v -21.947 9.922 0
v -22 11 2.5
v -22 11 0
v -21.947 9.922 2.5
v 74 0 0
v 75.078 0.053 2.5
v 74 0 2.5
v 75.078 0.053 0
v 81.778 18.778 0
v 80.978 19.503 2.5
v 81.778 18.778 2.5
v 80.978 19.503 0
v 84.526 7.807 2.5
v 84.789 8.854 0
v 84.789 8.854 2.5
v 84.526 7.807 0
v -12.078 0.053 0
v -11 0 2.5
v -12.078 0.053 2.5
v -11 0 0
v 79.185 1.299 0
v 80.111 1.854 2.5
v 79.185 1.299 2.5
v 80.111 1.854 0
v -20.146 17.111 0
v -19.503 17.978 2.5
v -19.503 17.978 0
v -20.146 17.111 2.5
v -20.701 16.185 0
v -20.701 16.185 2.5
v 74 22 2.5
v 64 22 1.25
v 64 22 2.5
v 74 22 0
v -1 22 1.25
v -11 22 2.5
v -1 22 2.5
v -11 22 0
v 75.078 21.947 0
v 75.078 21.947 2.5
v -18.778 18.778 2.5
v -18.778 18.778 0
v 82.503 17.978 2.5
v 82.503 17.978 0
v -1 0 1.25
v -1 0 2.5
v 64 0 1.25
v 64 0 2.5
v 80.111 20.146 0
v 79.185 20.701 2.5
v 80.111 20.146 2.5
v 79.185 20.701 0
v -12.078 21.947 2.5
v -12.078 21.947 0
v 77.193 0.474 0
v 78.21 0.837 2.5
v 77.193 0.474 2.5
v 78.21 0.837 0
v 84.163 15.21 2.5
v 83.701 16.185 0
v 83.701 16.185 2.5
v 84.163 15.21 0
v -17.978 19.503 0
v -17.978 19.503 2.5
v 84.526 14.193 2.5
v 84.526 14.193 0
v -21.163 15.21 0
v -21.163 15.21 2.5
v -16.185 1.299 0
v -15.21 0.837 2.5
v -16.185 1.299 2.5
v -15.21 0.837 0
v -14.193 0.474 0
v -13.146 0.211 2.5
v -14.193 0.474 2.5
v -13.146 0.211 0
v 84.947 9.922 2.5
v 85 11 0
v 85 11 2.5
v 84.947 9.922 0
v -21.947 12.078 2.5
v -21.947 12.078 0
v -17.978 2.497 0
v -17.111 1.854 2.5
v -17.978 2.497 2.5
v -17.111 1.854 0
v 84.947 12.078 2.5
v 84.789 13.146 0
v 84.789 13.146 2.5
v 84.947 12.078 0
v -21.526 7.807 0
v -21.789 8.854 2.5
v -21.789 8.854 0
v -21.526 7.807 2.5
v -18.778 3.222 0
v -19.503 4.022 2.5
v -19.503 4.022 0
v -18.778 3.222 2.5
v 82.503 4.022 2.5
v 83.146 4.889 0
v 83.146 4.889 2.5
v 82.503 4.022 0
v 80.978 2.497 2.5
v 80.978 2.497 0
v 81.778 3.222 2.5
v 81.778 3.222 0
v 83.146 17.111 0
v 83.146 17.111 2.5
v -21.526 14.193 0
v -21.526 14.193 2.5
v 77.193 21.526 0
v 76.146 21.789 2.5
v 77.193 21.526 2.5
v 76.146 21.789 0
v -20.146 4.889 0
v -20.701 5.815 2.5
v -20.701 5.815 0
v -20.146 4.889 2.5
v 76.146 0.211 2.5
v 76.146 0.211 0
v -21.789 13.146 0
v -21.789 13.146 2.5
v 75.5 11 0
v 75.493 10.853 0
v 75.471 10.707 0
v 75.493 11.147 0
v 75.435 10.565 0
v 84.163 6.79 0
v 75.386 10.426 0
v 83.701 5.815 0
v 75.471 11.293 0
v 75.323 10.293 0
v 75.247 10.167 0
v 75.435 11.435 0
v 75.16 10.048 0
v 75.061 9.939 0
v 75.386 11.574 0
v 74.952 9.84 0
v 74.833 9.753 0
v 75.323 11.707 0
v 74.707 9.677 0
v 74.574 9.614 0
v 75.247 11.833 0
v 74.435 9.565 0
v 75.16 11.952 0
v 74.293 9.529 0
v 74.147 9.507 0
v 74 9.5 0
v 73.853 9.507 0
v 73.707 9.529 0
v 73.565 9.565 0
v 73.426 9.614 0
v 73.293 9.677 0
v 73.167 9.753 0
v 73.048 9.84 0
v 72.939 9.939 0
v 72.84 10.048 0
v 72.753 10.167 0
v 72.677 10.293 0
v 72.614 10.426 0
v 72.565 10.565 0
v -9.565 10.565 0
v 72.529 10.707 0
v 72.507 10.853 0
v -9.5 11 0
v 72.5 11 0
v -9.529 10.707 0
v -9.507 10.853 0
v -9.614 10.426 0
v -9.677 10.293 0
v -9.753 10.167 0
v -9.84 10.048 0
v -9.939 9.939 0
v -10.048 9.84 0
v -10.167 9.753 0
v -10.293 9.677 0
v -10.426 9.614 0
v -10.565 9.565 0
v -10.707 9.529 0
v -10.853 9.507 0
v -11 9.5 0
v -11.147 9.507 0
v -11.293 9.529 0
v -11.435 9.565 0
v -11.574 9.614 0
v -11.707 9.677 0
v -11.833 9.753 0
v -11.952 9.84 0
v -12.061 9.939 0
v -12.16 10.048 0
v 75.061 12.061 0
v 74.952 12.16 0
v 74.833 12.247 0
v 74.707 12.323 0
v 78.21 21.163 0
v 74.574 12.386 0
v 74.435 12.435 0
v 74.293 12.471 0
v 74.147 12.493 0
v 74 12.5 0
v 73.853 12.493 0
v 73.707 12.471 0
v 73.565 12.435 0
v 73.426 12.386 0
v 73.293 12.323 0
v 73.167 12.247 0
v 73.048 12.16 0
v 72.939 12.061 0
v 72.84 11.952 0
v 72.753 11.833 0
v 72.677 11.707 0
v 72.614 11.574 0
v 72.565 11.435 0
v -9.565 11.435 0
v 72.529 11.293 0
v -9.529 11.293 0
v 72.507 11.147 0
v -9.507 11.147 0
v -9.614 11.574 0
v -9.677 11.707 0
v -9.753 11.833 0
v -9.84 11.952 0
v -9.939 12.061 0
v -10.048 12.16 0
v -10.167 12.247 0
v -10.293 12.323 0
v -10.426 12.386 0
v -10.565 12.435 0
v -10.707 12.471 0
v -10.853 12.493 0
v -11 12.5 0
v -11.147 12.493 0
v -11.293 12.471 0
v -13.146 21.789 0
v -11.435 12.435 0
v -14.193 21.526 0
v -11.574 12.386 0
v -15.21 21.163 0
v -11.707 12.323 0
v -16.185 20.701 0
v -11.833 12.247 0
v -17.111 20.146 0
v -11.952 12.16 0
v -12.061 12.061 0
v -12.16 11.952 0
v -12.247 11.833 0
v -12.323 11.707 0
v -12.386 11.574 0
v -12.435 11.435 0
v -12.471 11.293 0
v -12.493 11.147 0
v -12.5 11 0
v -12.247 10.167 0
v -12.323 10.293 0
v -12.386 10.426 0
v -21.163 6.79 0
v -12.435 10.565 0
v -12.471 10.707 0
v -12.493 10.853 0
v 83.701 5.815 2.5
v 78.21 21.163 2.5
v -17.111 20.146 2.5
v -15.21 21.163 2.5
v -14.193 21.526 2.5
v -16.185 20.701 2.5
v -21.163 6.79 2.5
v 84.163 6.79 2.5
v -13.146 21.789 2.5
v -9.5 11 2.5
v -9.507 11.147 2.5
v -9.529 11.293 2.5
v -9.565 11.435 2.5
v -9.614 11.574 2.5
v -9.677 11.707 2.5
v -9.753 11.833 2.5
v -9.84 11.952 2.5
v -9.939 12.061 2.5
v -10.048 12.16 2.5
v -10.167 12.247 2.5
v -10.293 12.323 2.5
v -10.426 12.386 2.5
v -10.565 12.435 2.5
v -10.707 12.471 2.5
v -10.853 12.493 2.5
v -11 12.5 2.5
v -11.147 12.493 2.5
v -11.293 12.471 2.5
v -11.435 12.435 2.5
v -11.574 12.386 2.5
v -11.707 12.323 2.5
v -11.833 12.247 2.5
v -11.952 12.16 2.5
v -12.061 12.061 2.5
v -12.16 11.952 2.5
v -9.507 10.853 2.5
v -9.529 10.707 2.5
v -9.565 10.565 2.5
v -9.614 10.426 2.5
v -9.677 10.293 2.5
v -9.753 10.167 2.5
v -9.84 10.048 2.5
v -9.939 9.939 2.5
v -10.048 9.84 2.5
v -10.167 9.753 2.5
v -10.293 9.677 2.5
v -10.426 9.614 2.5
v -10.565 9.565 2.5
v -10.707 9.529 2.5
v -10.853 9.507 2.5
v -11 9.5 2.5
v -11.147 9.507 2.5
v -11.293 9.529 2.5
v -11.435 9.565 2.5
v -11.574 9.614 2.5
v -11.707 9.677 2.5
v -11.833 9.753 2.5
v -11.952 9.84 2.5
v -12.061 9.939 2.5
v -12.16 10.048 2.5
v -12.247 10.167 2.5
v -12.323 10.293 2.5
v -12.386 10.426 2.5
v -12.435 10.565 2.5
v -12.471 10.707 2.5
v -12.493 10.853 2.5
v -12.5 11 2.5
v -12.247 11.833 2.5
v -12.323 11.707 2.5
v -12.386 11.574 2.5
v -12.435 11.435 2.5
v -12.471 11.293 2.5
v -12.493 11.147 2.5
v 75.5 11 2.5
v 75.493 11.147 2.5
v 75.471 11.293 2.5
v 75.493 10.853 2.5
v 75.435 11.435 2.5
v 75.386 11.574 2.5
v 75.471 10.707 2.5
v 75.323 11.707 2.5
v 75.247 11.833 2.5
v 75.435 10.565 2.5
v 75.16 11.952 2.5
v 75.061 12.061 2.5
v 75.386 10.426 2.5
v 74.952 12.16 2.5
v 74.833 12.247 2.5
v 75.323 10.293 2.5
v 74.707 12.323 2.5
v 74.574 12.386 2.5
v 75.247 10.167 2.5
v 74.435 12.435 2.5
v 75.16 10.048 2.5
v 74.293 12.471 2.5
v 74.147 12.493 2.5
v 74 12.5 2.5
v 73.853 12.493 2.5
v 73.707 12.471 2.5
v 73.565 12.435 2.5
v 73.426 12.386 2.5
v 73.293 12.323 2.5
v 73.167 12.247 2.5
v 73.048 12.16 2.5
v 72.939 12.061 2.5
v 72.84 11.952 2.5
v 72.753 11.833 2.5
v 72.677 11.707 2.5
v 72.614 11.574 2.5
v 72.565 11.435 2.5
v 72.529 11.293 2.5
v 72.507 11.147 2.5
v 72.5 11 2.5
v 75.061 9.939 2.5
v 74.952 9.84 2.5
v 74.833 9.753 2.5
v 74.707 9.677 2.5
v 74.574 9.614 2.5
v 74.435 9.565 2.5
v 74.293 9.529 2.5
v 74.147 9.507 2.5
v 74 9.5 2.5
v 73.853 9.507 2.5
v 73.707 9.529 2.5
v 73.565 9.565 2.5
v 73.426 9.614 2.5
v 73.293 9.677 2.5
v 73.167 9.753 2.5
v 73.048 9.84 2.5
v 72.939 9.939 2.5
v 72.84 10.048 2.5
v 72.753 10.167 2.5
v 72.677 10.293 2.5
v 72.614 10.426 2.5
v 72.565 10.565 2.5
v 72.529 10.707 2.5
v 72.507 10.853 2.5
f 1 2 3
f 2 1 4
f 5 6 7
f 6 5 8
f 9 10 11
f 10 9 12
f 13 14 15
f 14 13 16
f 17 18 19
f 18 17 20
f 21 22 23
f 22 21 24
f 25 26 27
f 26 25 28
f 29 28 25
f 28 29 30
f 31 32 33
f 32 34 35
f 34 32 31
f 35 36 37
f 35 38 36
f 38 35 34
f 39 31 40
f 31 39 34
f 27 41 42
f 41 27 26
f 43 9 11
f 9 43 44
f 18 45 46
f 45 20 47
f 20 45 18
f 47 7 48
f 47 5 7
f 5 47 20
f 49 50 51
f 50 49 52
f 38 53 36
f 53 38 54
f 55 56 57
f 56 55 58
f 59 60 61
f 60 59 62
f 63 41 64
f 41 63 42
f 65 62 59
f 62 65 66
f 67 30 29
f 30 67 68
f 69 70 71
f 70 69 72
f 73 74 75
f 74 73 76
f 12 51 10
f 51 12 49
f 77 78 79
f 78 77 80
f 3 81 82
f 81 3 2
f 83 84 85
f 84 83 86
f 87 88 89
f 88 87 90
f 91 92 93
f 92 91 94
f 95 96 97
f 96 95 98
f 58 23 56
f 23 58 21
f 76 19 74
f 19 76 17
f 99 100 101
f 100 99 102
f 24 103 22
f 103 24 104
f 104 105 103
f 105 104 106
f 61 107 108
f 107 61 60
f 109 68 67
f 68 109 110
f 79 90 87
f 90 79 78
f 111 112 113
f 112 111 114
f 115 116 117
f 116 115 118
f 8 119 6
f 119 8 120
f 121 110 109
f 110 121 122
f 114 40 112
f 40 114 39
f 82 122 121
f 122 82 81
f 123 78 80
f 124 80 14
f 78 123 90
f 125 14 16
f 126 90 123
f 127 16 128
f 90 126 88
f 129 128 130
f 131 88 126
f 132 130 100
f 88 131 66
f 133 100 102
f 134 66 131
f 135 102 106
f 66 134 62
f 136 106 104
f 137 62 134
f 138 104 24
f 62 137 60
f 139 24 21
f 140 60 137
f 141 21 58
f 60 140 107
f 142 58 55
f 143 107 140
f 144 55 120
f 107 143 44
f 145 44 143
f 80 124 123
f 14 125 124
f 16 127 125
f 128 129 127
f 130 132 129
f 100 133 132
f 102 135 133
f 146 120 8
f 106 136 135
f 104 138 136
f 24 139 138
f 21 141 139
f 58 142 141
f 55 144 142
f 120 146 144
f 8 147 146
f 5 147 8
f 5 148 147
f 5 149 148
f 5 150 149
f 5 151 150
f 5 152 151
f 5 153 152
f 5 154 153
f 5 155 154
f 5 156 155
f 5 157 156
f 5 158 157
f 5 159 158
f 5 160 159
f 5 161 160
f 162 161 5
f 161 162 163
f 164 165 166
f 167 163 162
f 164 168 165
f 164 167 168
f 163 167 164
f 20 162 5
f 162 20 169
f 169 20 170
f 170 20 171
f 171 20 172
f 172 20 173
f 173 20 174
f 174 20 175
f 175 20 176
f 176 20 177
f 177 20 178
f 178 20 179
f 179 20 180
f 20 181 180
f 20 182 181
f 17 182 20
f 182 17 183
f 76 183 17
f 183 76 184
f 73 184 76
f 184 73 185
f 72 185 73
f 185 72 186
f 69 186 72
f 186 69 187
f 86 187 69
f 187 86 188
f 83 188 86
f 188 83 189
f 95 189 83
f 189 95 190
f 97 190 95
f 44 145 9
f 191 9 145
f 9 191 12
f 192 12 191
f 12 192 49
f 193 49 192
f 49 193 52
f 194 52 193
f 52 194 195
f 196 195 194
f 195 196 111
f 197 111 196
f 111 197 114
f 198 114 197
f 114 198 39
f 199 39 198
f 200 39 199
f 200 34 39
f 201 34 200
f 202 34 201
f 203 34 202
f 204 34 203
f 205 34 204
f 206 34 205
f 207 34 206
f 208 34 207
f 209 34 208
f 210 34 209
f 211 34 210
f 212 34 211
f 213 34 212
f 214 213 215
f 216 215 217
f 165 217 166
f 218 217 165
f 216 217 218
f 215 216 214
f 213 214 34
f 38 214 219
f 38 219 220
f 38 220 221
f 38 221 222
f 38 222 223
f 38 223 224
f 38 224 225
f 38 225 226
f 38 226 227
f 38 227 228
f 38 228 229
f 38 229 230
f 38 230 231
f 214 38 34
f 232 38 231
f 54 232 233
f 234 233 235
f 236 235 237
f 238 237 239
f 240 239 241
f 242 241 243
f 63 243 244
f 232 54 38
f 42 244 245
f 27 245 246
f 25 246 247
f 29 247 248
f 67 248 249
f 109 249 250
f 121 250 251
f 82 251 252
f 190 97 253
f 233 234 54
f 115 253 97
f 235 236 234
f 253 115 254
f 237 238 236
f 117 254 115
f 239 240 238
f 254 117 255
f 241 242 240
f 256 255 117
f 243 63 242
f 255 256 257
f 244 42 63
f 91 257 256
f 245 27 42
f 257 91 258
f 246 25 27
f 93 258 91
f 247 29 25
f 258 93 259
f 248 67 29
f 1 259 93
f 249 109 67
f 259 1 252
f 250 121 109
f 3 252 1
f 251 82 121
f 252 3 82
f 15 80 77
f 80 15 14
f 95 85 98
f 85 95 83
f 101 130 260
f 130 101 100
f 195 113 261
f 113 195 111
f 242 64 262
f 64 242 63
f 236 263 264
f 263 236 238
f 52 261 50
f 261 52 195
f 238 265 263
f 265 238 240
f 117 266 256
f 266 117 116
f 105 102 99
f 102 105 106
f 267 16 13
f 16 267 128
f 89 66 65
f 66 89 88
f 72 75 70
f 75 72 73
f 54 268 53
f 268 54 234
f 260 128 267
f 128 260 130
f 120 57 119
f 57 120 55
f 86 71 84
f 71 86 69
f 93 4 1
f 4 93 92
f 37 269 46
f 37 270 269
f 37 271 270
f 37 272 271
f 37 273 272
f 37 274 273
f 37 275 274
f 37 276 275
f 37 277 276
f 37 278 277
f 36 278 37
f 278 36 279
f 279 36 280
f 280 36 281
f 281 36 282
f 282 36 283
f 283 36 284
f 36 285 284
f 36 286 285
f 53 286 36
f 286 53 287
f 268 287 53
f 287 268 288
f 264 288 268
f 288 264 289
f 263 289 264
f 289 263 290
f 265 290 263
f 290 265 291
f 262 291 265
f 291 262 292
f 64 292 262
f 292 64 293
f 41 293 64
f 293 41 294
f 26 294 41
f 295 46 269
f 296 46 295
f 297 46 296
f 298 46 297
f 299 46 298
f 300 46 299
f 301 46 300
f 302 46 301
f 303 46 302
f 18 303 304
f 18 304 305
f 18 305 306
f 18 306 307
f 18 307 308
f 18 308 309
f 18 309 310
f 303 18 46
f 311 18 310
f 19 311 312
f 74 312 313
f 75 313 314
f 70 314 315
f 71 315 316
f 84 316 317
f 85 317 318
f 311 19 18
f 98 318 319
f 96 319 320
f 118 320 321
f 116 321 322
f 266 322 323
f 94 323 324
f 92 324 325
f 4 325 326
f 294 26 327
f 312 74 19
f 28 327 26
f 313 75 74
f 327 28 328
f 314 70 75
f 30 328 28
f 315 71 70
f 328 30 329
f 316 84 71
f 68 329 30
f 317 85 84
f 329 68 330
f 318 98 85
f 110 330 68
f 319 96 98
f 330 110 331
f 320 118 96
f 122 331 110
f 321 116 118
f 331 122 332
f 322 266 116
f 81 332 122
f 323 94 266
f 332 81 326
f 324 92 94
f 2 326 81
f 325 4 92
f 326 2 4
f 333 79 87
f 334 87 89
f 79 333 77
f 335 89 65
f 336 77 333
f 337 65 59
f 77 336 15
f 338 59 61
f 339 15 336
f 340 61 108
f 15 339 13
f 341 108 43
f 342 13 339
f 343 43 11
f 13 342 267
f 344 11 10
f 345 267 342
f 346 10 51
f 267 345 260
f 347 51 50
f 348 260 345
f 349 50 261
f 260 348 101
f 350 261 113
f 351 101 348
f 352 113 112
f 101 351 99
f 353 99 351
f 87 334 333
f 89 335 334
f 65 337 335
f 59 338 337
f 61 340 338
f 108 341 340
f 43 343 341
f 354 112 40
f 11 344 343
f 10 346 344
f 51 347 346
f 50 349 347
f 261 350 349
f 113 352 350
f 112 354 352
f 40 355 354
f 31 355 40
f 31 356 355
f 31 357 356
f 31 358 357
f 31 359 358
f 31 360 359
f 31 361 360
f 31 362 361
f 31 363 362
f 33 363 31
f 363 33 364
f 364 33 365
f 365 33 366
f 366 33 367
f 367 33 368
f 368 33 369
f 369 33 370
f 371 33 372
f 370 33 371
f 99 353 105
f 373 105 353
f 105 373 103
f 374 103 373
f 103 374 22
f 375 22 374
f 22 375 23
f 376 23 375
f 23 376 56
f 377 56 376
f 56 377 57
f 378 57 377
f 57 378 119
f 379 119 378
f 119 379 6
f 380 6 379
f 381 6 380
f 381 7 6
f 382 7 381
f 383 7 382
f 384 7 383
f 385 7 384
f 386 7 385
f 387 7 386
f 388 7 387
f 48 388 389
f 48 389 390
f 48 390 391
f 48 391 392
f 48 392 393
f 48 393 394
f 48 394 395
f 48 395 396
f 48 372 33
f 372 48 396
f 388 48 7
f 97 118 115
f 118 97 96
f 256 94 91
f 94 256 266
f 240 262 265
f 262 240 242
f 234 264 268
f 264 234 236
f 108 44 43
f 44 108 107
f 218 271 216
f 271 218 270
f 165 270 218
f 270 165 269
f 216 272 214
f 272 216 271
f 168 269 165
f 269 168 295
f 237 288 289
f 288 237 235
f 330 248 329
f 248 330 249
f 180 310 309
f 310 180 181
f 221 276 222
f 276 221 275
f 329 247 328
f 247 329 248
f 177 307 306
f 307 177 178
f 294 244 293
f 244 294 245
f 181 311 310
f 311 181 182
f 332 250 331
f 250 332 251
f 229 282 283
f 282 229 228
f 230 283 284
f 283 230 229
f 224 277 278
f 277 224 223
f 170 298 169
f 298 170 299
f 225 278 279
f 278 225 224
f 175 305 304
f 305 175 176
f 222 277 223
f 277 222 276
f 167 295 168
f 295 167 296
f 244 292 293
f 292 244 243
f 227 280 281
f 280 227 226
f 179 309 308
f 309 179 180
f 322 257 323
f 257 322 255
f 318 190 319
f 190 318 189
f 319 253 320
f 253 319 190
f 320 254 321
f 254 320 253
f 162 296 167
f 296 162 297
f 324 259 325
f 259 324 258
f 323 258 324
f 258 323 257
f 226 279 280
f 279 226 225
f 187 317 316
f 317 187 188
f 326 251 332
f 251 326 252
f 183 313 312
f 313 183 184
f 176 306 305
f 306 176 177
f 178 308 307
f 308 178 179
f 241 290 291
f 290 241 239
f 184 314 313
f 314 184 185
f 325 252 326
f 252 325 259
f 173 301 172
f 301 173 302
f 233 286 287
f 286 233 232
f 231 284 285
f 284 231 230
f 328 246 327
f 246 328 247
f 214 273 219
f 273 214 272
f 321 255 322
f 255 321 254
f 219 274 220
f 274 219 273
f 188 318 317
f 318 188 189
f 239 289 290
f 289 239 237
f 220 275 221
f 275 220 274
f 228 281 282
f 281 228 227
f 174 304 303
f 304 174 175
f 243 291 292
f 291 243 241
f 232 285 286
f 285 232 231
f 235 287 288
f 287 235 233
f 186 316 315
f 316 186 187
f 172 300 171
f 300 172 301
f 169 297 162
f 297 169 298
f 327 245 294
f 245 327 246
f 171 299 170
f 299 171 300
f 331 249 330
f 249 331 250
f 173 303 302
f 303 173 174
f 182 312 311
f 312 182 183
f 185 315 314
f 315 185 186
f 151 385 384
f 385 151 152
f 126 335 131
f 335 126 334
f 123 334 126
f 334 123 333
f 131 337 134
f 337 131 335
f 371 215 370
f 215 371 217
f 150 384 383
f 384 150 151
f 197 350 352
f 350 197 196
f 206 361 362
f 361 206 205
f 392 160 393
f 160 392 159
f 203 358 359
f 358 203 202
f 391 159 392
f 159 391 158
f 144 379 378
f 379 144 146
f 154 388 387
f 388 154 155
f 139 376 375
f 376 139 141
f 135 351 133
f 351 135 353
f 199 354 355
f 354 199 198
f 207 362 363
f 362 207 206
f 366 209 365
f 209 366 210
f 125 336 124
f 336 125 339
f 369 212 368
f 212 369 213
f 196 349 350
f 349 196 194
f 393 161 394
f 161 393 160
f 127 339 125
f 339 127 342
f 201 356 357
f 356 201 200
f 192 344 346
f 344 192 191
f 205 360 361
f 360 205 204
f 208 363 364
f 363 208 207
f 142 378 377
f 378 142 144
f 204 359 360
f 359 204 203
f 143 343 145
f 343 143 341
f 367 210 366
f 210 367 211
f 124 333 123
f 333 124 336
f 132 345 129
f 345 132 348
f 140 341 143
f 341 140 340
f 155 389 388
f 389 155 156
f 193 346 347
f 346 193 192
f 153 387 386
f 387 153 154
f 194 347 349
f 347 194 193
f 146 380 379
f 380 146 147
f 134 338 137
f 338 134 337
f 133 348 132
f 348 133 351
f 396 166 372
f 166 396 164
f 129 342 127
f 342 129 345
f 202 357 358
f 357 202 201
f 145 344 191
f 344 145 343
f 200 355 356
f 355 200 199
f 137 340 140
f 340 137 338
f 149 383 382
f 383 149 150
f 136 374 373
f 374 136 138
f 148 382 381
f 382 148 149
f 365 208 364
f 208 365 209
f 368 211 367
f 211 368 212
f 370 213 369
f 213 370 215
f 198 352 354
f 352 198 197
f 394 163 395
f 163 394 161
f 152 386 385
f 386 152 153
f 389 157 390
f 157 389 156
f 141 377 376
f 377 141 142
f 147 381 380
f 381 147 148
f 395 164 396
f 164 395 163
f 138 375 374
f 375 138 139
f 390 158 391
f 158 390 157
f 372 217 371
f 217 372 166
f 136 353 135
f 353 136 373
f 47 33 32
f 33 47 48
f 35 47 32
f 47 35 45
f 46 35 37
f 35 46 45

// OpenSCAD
PCB_X = 63;
PCB_Z = 1.25;
PCB_Y = 22;
PCB_X_FUDGE = 2;

HOLE_DIAM = 3;

difference() {

    hull() {
        translate([-0.5 * PCB_Y, 0.5 * PCB_Y, 0]) cylinder(h=2 * PCB_Z, d=PCB_Y, $fn=64);
        translate([PCB_X + (0.5 * PCB_Y), 0.5 * PCB_Y, 0]) cylinder(h=2 * PCB_Z, d=PCB_Y, $fn=64);
    }
    translate([-0.5 * PCB_Y, 0.5 * PCB_Y, 0]) cylinder(h=2 * PCB_Z, d=HOLE_DIAM, $fn=64);
    translate([PCB_X + (0.5 * PCB_Y), 0.5 * PCB_Y, 0]) cylinder(h=2 * PCB_Z, d=HOLE_DIAM, $fn=64);
    translate([-0.5 * PCB_X_FUDGE, 0, PCB_Z]) cube([PCB_X + PCB_X_FUDGE, PCB_Y, PCB_Z]);
}

    
    
